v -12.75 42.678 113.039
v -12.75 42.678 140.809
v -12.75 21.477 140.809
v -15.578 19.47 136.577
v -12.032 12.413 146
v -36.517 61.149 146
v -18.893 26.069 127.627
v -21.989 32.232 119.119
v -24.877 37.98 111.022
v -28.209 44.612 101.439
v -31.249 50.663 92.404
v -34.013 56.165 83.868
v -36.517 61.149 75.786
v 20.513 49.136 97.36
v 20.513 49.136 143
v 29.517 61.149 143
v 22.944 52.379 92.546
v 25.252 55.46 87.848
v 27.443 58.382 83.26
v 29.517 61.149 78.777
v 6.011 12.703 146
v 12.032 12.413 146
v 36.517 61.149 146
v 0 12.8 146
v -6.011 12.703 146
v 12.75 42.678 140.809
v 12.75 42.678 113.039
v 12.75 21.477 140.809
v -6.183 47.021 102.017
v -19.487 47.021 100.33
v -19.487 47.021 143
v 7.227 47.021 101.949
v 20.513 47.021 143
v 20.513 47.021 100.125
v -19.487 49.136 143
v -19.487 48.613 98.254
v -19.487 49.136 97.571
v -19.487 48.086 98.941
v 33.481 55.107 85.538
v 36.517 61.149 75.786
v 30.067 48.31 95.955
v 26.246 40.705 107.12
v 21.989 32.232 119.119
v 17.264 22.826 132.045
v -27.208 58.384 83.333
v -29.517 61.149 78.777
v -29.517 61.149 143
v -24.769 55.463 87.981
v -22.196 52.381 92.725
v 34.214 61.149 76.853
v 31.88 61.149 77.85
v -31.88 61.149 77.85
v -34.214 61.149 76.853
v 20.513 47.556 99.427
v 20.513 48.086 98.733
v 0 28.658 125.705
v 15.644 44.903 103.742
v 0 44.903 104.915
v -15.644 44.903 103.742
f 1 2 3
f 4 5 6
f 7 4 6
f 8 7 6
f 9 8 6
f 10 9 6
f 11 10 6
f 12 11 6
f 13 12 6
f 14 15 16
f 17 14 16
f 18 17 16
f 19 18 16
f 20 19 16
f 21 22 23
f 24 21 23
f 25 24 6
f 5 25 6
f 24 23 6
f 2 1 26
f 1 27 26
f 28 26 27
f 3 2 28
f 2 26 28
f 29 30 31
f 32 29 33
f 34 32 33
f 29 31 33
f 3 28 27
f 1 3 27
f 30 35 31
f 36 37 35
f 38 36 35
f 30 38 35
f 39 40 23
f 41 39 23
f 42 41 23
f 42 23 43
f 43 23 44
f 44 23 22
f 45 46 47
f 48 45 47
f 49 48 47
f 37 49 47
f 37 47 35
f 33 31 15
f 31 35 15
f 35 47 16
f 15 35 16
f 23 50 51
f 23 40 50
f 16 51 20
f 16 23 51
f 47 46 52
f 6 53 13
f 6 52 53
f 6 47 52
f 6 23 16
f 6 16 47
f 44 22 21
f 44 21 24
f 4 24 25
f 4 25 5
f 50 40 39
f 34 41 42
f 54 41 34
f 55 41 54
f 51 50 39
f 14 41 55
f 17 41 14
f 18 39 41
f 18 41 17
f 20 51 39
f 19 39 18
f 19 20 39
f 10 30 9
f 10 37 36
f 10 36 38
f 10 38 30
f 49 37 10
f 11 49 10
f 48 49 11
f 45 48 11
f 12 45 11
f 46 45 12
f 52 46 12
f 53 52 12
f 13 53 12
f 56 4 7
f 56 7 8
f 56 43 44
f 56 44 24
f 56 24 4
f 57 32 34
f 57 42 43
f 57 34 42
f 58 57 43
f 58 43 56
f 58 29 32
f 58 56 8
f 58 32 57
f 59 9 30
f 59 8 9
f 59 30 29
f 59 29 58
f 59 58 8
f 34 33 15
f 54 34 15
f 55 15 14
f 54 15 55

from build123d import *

# Parameters (mm, degrees)
BOSS_EXTRU_5_START       = 146
BOSS_EXTRU_5_DEPTH       = 71.6
ENL_V_START              = 143
ENL_V_MAT_EXTRU_16_DEPTH = 68.8
ENL_V_MAT_EXTRU_17_DEPTH = 12.75


with BuildPart() as part:
    # Esquisse21 → Boss.-Extru.5 (new body)
    with BuildSketch(Plane.XY.offset(BOSS_EXTRU_5_START)):
        Polygon((0, 61.14881388), (36.516512378, 61.14881388), (7.78303179, 3.954740649), (0, 3.954740649), (-7.78303179, 3.954740649), (-36.516512378, 61.14881388), align=None)
    extrude(amount=-BOSS_EXTRU_5_DEPTH)

    # Esquisse25 → Enlèv. mat.-Extru.16 (cut)
    with BuildSketch(Plane.XY.offset(ENL_V_START)):
        Polygon((-19.487098976, 47.02133199), (20.512901024, 47.02133199), (20.512901024, 49.136323087), (29.516512378, 61.14881388), (-29.516512378, 61.14881388), (-19.487098976, 49.136323087), align=None)
    extrude(amount=-ENL_V_MAT_EXTRU_16_DEPTH, mode=Mode.SUBTRACT)

    # Esquisse28 → Enlèvement de matière-Révolution1 (revolve, cut)
    with BuildSketch(Plane.XY):
        Polygon((0, 80), (0, -62.094926462), (151.911852074, -62.094926462), (151.911852074, 8.180052285), (60, 80), align=None)
    revolve(axis=Axis((0, 178.385130013, 0), (0, -1, 0)), mode=Mode.SUBTRACT)

    # Esquisse29 → Enlèv. mat.-Extru.17 (cut, symmetric)
    with BuildSketch(Plane(origin=(0, 0, 0), x_dir=(0, 0, -1), z_dir=(1, 0, 0))):
        Polygon((-140.809307475, 42.678321443), (-140.809307475, 21.477456774), (-113.038923412, 42.678321443), align=None)
    extrude(amount=ENL_V_MAT_EXTRU_17_DEPTH, both=True, mode=Mode.SUBTRACT)


solid = part.part
